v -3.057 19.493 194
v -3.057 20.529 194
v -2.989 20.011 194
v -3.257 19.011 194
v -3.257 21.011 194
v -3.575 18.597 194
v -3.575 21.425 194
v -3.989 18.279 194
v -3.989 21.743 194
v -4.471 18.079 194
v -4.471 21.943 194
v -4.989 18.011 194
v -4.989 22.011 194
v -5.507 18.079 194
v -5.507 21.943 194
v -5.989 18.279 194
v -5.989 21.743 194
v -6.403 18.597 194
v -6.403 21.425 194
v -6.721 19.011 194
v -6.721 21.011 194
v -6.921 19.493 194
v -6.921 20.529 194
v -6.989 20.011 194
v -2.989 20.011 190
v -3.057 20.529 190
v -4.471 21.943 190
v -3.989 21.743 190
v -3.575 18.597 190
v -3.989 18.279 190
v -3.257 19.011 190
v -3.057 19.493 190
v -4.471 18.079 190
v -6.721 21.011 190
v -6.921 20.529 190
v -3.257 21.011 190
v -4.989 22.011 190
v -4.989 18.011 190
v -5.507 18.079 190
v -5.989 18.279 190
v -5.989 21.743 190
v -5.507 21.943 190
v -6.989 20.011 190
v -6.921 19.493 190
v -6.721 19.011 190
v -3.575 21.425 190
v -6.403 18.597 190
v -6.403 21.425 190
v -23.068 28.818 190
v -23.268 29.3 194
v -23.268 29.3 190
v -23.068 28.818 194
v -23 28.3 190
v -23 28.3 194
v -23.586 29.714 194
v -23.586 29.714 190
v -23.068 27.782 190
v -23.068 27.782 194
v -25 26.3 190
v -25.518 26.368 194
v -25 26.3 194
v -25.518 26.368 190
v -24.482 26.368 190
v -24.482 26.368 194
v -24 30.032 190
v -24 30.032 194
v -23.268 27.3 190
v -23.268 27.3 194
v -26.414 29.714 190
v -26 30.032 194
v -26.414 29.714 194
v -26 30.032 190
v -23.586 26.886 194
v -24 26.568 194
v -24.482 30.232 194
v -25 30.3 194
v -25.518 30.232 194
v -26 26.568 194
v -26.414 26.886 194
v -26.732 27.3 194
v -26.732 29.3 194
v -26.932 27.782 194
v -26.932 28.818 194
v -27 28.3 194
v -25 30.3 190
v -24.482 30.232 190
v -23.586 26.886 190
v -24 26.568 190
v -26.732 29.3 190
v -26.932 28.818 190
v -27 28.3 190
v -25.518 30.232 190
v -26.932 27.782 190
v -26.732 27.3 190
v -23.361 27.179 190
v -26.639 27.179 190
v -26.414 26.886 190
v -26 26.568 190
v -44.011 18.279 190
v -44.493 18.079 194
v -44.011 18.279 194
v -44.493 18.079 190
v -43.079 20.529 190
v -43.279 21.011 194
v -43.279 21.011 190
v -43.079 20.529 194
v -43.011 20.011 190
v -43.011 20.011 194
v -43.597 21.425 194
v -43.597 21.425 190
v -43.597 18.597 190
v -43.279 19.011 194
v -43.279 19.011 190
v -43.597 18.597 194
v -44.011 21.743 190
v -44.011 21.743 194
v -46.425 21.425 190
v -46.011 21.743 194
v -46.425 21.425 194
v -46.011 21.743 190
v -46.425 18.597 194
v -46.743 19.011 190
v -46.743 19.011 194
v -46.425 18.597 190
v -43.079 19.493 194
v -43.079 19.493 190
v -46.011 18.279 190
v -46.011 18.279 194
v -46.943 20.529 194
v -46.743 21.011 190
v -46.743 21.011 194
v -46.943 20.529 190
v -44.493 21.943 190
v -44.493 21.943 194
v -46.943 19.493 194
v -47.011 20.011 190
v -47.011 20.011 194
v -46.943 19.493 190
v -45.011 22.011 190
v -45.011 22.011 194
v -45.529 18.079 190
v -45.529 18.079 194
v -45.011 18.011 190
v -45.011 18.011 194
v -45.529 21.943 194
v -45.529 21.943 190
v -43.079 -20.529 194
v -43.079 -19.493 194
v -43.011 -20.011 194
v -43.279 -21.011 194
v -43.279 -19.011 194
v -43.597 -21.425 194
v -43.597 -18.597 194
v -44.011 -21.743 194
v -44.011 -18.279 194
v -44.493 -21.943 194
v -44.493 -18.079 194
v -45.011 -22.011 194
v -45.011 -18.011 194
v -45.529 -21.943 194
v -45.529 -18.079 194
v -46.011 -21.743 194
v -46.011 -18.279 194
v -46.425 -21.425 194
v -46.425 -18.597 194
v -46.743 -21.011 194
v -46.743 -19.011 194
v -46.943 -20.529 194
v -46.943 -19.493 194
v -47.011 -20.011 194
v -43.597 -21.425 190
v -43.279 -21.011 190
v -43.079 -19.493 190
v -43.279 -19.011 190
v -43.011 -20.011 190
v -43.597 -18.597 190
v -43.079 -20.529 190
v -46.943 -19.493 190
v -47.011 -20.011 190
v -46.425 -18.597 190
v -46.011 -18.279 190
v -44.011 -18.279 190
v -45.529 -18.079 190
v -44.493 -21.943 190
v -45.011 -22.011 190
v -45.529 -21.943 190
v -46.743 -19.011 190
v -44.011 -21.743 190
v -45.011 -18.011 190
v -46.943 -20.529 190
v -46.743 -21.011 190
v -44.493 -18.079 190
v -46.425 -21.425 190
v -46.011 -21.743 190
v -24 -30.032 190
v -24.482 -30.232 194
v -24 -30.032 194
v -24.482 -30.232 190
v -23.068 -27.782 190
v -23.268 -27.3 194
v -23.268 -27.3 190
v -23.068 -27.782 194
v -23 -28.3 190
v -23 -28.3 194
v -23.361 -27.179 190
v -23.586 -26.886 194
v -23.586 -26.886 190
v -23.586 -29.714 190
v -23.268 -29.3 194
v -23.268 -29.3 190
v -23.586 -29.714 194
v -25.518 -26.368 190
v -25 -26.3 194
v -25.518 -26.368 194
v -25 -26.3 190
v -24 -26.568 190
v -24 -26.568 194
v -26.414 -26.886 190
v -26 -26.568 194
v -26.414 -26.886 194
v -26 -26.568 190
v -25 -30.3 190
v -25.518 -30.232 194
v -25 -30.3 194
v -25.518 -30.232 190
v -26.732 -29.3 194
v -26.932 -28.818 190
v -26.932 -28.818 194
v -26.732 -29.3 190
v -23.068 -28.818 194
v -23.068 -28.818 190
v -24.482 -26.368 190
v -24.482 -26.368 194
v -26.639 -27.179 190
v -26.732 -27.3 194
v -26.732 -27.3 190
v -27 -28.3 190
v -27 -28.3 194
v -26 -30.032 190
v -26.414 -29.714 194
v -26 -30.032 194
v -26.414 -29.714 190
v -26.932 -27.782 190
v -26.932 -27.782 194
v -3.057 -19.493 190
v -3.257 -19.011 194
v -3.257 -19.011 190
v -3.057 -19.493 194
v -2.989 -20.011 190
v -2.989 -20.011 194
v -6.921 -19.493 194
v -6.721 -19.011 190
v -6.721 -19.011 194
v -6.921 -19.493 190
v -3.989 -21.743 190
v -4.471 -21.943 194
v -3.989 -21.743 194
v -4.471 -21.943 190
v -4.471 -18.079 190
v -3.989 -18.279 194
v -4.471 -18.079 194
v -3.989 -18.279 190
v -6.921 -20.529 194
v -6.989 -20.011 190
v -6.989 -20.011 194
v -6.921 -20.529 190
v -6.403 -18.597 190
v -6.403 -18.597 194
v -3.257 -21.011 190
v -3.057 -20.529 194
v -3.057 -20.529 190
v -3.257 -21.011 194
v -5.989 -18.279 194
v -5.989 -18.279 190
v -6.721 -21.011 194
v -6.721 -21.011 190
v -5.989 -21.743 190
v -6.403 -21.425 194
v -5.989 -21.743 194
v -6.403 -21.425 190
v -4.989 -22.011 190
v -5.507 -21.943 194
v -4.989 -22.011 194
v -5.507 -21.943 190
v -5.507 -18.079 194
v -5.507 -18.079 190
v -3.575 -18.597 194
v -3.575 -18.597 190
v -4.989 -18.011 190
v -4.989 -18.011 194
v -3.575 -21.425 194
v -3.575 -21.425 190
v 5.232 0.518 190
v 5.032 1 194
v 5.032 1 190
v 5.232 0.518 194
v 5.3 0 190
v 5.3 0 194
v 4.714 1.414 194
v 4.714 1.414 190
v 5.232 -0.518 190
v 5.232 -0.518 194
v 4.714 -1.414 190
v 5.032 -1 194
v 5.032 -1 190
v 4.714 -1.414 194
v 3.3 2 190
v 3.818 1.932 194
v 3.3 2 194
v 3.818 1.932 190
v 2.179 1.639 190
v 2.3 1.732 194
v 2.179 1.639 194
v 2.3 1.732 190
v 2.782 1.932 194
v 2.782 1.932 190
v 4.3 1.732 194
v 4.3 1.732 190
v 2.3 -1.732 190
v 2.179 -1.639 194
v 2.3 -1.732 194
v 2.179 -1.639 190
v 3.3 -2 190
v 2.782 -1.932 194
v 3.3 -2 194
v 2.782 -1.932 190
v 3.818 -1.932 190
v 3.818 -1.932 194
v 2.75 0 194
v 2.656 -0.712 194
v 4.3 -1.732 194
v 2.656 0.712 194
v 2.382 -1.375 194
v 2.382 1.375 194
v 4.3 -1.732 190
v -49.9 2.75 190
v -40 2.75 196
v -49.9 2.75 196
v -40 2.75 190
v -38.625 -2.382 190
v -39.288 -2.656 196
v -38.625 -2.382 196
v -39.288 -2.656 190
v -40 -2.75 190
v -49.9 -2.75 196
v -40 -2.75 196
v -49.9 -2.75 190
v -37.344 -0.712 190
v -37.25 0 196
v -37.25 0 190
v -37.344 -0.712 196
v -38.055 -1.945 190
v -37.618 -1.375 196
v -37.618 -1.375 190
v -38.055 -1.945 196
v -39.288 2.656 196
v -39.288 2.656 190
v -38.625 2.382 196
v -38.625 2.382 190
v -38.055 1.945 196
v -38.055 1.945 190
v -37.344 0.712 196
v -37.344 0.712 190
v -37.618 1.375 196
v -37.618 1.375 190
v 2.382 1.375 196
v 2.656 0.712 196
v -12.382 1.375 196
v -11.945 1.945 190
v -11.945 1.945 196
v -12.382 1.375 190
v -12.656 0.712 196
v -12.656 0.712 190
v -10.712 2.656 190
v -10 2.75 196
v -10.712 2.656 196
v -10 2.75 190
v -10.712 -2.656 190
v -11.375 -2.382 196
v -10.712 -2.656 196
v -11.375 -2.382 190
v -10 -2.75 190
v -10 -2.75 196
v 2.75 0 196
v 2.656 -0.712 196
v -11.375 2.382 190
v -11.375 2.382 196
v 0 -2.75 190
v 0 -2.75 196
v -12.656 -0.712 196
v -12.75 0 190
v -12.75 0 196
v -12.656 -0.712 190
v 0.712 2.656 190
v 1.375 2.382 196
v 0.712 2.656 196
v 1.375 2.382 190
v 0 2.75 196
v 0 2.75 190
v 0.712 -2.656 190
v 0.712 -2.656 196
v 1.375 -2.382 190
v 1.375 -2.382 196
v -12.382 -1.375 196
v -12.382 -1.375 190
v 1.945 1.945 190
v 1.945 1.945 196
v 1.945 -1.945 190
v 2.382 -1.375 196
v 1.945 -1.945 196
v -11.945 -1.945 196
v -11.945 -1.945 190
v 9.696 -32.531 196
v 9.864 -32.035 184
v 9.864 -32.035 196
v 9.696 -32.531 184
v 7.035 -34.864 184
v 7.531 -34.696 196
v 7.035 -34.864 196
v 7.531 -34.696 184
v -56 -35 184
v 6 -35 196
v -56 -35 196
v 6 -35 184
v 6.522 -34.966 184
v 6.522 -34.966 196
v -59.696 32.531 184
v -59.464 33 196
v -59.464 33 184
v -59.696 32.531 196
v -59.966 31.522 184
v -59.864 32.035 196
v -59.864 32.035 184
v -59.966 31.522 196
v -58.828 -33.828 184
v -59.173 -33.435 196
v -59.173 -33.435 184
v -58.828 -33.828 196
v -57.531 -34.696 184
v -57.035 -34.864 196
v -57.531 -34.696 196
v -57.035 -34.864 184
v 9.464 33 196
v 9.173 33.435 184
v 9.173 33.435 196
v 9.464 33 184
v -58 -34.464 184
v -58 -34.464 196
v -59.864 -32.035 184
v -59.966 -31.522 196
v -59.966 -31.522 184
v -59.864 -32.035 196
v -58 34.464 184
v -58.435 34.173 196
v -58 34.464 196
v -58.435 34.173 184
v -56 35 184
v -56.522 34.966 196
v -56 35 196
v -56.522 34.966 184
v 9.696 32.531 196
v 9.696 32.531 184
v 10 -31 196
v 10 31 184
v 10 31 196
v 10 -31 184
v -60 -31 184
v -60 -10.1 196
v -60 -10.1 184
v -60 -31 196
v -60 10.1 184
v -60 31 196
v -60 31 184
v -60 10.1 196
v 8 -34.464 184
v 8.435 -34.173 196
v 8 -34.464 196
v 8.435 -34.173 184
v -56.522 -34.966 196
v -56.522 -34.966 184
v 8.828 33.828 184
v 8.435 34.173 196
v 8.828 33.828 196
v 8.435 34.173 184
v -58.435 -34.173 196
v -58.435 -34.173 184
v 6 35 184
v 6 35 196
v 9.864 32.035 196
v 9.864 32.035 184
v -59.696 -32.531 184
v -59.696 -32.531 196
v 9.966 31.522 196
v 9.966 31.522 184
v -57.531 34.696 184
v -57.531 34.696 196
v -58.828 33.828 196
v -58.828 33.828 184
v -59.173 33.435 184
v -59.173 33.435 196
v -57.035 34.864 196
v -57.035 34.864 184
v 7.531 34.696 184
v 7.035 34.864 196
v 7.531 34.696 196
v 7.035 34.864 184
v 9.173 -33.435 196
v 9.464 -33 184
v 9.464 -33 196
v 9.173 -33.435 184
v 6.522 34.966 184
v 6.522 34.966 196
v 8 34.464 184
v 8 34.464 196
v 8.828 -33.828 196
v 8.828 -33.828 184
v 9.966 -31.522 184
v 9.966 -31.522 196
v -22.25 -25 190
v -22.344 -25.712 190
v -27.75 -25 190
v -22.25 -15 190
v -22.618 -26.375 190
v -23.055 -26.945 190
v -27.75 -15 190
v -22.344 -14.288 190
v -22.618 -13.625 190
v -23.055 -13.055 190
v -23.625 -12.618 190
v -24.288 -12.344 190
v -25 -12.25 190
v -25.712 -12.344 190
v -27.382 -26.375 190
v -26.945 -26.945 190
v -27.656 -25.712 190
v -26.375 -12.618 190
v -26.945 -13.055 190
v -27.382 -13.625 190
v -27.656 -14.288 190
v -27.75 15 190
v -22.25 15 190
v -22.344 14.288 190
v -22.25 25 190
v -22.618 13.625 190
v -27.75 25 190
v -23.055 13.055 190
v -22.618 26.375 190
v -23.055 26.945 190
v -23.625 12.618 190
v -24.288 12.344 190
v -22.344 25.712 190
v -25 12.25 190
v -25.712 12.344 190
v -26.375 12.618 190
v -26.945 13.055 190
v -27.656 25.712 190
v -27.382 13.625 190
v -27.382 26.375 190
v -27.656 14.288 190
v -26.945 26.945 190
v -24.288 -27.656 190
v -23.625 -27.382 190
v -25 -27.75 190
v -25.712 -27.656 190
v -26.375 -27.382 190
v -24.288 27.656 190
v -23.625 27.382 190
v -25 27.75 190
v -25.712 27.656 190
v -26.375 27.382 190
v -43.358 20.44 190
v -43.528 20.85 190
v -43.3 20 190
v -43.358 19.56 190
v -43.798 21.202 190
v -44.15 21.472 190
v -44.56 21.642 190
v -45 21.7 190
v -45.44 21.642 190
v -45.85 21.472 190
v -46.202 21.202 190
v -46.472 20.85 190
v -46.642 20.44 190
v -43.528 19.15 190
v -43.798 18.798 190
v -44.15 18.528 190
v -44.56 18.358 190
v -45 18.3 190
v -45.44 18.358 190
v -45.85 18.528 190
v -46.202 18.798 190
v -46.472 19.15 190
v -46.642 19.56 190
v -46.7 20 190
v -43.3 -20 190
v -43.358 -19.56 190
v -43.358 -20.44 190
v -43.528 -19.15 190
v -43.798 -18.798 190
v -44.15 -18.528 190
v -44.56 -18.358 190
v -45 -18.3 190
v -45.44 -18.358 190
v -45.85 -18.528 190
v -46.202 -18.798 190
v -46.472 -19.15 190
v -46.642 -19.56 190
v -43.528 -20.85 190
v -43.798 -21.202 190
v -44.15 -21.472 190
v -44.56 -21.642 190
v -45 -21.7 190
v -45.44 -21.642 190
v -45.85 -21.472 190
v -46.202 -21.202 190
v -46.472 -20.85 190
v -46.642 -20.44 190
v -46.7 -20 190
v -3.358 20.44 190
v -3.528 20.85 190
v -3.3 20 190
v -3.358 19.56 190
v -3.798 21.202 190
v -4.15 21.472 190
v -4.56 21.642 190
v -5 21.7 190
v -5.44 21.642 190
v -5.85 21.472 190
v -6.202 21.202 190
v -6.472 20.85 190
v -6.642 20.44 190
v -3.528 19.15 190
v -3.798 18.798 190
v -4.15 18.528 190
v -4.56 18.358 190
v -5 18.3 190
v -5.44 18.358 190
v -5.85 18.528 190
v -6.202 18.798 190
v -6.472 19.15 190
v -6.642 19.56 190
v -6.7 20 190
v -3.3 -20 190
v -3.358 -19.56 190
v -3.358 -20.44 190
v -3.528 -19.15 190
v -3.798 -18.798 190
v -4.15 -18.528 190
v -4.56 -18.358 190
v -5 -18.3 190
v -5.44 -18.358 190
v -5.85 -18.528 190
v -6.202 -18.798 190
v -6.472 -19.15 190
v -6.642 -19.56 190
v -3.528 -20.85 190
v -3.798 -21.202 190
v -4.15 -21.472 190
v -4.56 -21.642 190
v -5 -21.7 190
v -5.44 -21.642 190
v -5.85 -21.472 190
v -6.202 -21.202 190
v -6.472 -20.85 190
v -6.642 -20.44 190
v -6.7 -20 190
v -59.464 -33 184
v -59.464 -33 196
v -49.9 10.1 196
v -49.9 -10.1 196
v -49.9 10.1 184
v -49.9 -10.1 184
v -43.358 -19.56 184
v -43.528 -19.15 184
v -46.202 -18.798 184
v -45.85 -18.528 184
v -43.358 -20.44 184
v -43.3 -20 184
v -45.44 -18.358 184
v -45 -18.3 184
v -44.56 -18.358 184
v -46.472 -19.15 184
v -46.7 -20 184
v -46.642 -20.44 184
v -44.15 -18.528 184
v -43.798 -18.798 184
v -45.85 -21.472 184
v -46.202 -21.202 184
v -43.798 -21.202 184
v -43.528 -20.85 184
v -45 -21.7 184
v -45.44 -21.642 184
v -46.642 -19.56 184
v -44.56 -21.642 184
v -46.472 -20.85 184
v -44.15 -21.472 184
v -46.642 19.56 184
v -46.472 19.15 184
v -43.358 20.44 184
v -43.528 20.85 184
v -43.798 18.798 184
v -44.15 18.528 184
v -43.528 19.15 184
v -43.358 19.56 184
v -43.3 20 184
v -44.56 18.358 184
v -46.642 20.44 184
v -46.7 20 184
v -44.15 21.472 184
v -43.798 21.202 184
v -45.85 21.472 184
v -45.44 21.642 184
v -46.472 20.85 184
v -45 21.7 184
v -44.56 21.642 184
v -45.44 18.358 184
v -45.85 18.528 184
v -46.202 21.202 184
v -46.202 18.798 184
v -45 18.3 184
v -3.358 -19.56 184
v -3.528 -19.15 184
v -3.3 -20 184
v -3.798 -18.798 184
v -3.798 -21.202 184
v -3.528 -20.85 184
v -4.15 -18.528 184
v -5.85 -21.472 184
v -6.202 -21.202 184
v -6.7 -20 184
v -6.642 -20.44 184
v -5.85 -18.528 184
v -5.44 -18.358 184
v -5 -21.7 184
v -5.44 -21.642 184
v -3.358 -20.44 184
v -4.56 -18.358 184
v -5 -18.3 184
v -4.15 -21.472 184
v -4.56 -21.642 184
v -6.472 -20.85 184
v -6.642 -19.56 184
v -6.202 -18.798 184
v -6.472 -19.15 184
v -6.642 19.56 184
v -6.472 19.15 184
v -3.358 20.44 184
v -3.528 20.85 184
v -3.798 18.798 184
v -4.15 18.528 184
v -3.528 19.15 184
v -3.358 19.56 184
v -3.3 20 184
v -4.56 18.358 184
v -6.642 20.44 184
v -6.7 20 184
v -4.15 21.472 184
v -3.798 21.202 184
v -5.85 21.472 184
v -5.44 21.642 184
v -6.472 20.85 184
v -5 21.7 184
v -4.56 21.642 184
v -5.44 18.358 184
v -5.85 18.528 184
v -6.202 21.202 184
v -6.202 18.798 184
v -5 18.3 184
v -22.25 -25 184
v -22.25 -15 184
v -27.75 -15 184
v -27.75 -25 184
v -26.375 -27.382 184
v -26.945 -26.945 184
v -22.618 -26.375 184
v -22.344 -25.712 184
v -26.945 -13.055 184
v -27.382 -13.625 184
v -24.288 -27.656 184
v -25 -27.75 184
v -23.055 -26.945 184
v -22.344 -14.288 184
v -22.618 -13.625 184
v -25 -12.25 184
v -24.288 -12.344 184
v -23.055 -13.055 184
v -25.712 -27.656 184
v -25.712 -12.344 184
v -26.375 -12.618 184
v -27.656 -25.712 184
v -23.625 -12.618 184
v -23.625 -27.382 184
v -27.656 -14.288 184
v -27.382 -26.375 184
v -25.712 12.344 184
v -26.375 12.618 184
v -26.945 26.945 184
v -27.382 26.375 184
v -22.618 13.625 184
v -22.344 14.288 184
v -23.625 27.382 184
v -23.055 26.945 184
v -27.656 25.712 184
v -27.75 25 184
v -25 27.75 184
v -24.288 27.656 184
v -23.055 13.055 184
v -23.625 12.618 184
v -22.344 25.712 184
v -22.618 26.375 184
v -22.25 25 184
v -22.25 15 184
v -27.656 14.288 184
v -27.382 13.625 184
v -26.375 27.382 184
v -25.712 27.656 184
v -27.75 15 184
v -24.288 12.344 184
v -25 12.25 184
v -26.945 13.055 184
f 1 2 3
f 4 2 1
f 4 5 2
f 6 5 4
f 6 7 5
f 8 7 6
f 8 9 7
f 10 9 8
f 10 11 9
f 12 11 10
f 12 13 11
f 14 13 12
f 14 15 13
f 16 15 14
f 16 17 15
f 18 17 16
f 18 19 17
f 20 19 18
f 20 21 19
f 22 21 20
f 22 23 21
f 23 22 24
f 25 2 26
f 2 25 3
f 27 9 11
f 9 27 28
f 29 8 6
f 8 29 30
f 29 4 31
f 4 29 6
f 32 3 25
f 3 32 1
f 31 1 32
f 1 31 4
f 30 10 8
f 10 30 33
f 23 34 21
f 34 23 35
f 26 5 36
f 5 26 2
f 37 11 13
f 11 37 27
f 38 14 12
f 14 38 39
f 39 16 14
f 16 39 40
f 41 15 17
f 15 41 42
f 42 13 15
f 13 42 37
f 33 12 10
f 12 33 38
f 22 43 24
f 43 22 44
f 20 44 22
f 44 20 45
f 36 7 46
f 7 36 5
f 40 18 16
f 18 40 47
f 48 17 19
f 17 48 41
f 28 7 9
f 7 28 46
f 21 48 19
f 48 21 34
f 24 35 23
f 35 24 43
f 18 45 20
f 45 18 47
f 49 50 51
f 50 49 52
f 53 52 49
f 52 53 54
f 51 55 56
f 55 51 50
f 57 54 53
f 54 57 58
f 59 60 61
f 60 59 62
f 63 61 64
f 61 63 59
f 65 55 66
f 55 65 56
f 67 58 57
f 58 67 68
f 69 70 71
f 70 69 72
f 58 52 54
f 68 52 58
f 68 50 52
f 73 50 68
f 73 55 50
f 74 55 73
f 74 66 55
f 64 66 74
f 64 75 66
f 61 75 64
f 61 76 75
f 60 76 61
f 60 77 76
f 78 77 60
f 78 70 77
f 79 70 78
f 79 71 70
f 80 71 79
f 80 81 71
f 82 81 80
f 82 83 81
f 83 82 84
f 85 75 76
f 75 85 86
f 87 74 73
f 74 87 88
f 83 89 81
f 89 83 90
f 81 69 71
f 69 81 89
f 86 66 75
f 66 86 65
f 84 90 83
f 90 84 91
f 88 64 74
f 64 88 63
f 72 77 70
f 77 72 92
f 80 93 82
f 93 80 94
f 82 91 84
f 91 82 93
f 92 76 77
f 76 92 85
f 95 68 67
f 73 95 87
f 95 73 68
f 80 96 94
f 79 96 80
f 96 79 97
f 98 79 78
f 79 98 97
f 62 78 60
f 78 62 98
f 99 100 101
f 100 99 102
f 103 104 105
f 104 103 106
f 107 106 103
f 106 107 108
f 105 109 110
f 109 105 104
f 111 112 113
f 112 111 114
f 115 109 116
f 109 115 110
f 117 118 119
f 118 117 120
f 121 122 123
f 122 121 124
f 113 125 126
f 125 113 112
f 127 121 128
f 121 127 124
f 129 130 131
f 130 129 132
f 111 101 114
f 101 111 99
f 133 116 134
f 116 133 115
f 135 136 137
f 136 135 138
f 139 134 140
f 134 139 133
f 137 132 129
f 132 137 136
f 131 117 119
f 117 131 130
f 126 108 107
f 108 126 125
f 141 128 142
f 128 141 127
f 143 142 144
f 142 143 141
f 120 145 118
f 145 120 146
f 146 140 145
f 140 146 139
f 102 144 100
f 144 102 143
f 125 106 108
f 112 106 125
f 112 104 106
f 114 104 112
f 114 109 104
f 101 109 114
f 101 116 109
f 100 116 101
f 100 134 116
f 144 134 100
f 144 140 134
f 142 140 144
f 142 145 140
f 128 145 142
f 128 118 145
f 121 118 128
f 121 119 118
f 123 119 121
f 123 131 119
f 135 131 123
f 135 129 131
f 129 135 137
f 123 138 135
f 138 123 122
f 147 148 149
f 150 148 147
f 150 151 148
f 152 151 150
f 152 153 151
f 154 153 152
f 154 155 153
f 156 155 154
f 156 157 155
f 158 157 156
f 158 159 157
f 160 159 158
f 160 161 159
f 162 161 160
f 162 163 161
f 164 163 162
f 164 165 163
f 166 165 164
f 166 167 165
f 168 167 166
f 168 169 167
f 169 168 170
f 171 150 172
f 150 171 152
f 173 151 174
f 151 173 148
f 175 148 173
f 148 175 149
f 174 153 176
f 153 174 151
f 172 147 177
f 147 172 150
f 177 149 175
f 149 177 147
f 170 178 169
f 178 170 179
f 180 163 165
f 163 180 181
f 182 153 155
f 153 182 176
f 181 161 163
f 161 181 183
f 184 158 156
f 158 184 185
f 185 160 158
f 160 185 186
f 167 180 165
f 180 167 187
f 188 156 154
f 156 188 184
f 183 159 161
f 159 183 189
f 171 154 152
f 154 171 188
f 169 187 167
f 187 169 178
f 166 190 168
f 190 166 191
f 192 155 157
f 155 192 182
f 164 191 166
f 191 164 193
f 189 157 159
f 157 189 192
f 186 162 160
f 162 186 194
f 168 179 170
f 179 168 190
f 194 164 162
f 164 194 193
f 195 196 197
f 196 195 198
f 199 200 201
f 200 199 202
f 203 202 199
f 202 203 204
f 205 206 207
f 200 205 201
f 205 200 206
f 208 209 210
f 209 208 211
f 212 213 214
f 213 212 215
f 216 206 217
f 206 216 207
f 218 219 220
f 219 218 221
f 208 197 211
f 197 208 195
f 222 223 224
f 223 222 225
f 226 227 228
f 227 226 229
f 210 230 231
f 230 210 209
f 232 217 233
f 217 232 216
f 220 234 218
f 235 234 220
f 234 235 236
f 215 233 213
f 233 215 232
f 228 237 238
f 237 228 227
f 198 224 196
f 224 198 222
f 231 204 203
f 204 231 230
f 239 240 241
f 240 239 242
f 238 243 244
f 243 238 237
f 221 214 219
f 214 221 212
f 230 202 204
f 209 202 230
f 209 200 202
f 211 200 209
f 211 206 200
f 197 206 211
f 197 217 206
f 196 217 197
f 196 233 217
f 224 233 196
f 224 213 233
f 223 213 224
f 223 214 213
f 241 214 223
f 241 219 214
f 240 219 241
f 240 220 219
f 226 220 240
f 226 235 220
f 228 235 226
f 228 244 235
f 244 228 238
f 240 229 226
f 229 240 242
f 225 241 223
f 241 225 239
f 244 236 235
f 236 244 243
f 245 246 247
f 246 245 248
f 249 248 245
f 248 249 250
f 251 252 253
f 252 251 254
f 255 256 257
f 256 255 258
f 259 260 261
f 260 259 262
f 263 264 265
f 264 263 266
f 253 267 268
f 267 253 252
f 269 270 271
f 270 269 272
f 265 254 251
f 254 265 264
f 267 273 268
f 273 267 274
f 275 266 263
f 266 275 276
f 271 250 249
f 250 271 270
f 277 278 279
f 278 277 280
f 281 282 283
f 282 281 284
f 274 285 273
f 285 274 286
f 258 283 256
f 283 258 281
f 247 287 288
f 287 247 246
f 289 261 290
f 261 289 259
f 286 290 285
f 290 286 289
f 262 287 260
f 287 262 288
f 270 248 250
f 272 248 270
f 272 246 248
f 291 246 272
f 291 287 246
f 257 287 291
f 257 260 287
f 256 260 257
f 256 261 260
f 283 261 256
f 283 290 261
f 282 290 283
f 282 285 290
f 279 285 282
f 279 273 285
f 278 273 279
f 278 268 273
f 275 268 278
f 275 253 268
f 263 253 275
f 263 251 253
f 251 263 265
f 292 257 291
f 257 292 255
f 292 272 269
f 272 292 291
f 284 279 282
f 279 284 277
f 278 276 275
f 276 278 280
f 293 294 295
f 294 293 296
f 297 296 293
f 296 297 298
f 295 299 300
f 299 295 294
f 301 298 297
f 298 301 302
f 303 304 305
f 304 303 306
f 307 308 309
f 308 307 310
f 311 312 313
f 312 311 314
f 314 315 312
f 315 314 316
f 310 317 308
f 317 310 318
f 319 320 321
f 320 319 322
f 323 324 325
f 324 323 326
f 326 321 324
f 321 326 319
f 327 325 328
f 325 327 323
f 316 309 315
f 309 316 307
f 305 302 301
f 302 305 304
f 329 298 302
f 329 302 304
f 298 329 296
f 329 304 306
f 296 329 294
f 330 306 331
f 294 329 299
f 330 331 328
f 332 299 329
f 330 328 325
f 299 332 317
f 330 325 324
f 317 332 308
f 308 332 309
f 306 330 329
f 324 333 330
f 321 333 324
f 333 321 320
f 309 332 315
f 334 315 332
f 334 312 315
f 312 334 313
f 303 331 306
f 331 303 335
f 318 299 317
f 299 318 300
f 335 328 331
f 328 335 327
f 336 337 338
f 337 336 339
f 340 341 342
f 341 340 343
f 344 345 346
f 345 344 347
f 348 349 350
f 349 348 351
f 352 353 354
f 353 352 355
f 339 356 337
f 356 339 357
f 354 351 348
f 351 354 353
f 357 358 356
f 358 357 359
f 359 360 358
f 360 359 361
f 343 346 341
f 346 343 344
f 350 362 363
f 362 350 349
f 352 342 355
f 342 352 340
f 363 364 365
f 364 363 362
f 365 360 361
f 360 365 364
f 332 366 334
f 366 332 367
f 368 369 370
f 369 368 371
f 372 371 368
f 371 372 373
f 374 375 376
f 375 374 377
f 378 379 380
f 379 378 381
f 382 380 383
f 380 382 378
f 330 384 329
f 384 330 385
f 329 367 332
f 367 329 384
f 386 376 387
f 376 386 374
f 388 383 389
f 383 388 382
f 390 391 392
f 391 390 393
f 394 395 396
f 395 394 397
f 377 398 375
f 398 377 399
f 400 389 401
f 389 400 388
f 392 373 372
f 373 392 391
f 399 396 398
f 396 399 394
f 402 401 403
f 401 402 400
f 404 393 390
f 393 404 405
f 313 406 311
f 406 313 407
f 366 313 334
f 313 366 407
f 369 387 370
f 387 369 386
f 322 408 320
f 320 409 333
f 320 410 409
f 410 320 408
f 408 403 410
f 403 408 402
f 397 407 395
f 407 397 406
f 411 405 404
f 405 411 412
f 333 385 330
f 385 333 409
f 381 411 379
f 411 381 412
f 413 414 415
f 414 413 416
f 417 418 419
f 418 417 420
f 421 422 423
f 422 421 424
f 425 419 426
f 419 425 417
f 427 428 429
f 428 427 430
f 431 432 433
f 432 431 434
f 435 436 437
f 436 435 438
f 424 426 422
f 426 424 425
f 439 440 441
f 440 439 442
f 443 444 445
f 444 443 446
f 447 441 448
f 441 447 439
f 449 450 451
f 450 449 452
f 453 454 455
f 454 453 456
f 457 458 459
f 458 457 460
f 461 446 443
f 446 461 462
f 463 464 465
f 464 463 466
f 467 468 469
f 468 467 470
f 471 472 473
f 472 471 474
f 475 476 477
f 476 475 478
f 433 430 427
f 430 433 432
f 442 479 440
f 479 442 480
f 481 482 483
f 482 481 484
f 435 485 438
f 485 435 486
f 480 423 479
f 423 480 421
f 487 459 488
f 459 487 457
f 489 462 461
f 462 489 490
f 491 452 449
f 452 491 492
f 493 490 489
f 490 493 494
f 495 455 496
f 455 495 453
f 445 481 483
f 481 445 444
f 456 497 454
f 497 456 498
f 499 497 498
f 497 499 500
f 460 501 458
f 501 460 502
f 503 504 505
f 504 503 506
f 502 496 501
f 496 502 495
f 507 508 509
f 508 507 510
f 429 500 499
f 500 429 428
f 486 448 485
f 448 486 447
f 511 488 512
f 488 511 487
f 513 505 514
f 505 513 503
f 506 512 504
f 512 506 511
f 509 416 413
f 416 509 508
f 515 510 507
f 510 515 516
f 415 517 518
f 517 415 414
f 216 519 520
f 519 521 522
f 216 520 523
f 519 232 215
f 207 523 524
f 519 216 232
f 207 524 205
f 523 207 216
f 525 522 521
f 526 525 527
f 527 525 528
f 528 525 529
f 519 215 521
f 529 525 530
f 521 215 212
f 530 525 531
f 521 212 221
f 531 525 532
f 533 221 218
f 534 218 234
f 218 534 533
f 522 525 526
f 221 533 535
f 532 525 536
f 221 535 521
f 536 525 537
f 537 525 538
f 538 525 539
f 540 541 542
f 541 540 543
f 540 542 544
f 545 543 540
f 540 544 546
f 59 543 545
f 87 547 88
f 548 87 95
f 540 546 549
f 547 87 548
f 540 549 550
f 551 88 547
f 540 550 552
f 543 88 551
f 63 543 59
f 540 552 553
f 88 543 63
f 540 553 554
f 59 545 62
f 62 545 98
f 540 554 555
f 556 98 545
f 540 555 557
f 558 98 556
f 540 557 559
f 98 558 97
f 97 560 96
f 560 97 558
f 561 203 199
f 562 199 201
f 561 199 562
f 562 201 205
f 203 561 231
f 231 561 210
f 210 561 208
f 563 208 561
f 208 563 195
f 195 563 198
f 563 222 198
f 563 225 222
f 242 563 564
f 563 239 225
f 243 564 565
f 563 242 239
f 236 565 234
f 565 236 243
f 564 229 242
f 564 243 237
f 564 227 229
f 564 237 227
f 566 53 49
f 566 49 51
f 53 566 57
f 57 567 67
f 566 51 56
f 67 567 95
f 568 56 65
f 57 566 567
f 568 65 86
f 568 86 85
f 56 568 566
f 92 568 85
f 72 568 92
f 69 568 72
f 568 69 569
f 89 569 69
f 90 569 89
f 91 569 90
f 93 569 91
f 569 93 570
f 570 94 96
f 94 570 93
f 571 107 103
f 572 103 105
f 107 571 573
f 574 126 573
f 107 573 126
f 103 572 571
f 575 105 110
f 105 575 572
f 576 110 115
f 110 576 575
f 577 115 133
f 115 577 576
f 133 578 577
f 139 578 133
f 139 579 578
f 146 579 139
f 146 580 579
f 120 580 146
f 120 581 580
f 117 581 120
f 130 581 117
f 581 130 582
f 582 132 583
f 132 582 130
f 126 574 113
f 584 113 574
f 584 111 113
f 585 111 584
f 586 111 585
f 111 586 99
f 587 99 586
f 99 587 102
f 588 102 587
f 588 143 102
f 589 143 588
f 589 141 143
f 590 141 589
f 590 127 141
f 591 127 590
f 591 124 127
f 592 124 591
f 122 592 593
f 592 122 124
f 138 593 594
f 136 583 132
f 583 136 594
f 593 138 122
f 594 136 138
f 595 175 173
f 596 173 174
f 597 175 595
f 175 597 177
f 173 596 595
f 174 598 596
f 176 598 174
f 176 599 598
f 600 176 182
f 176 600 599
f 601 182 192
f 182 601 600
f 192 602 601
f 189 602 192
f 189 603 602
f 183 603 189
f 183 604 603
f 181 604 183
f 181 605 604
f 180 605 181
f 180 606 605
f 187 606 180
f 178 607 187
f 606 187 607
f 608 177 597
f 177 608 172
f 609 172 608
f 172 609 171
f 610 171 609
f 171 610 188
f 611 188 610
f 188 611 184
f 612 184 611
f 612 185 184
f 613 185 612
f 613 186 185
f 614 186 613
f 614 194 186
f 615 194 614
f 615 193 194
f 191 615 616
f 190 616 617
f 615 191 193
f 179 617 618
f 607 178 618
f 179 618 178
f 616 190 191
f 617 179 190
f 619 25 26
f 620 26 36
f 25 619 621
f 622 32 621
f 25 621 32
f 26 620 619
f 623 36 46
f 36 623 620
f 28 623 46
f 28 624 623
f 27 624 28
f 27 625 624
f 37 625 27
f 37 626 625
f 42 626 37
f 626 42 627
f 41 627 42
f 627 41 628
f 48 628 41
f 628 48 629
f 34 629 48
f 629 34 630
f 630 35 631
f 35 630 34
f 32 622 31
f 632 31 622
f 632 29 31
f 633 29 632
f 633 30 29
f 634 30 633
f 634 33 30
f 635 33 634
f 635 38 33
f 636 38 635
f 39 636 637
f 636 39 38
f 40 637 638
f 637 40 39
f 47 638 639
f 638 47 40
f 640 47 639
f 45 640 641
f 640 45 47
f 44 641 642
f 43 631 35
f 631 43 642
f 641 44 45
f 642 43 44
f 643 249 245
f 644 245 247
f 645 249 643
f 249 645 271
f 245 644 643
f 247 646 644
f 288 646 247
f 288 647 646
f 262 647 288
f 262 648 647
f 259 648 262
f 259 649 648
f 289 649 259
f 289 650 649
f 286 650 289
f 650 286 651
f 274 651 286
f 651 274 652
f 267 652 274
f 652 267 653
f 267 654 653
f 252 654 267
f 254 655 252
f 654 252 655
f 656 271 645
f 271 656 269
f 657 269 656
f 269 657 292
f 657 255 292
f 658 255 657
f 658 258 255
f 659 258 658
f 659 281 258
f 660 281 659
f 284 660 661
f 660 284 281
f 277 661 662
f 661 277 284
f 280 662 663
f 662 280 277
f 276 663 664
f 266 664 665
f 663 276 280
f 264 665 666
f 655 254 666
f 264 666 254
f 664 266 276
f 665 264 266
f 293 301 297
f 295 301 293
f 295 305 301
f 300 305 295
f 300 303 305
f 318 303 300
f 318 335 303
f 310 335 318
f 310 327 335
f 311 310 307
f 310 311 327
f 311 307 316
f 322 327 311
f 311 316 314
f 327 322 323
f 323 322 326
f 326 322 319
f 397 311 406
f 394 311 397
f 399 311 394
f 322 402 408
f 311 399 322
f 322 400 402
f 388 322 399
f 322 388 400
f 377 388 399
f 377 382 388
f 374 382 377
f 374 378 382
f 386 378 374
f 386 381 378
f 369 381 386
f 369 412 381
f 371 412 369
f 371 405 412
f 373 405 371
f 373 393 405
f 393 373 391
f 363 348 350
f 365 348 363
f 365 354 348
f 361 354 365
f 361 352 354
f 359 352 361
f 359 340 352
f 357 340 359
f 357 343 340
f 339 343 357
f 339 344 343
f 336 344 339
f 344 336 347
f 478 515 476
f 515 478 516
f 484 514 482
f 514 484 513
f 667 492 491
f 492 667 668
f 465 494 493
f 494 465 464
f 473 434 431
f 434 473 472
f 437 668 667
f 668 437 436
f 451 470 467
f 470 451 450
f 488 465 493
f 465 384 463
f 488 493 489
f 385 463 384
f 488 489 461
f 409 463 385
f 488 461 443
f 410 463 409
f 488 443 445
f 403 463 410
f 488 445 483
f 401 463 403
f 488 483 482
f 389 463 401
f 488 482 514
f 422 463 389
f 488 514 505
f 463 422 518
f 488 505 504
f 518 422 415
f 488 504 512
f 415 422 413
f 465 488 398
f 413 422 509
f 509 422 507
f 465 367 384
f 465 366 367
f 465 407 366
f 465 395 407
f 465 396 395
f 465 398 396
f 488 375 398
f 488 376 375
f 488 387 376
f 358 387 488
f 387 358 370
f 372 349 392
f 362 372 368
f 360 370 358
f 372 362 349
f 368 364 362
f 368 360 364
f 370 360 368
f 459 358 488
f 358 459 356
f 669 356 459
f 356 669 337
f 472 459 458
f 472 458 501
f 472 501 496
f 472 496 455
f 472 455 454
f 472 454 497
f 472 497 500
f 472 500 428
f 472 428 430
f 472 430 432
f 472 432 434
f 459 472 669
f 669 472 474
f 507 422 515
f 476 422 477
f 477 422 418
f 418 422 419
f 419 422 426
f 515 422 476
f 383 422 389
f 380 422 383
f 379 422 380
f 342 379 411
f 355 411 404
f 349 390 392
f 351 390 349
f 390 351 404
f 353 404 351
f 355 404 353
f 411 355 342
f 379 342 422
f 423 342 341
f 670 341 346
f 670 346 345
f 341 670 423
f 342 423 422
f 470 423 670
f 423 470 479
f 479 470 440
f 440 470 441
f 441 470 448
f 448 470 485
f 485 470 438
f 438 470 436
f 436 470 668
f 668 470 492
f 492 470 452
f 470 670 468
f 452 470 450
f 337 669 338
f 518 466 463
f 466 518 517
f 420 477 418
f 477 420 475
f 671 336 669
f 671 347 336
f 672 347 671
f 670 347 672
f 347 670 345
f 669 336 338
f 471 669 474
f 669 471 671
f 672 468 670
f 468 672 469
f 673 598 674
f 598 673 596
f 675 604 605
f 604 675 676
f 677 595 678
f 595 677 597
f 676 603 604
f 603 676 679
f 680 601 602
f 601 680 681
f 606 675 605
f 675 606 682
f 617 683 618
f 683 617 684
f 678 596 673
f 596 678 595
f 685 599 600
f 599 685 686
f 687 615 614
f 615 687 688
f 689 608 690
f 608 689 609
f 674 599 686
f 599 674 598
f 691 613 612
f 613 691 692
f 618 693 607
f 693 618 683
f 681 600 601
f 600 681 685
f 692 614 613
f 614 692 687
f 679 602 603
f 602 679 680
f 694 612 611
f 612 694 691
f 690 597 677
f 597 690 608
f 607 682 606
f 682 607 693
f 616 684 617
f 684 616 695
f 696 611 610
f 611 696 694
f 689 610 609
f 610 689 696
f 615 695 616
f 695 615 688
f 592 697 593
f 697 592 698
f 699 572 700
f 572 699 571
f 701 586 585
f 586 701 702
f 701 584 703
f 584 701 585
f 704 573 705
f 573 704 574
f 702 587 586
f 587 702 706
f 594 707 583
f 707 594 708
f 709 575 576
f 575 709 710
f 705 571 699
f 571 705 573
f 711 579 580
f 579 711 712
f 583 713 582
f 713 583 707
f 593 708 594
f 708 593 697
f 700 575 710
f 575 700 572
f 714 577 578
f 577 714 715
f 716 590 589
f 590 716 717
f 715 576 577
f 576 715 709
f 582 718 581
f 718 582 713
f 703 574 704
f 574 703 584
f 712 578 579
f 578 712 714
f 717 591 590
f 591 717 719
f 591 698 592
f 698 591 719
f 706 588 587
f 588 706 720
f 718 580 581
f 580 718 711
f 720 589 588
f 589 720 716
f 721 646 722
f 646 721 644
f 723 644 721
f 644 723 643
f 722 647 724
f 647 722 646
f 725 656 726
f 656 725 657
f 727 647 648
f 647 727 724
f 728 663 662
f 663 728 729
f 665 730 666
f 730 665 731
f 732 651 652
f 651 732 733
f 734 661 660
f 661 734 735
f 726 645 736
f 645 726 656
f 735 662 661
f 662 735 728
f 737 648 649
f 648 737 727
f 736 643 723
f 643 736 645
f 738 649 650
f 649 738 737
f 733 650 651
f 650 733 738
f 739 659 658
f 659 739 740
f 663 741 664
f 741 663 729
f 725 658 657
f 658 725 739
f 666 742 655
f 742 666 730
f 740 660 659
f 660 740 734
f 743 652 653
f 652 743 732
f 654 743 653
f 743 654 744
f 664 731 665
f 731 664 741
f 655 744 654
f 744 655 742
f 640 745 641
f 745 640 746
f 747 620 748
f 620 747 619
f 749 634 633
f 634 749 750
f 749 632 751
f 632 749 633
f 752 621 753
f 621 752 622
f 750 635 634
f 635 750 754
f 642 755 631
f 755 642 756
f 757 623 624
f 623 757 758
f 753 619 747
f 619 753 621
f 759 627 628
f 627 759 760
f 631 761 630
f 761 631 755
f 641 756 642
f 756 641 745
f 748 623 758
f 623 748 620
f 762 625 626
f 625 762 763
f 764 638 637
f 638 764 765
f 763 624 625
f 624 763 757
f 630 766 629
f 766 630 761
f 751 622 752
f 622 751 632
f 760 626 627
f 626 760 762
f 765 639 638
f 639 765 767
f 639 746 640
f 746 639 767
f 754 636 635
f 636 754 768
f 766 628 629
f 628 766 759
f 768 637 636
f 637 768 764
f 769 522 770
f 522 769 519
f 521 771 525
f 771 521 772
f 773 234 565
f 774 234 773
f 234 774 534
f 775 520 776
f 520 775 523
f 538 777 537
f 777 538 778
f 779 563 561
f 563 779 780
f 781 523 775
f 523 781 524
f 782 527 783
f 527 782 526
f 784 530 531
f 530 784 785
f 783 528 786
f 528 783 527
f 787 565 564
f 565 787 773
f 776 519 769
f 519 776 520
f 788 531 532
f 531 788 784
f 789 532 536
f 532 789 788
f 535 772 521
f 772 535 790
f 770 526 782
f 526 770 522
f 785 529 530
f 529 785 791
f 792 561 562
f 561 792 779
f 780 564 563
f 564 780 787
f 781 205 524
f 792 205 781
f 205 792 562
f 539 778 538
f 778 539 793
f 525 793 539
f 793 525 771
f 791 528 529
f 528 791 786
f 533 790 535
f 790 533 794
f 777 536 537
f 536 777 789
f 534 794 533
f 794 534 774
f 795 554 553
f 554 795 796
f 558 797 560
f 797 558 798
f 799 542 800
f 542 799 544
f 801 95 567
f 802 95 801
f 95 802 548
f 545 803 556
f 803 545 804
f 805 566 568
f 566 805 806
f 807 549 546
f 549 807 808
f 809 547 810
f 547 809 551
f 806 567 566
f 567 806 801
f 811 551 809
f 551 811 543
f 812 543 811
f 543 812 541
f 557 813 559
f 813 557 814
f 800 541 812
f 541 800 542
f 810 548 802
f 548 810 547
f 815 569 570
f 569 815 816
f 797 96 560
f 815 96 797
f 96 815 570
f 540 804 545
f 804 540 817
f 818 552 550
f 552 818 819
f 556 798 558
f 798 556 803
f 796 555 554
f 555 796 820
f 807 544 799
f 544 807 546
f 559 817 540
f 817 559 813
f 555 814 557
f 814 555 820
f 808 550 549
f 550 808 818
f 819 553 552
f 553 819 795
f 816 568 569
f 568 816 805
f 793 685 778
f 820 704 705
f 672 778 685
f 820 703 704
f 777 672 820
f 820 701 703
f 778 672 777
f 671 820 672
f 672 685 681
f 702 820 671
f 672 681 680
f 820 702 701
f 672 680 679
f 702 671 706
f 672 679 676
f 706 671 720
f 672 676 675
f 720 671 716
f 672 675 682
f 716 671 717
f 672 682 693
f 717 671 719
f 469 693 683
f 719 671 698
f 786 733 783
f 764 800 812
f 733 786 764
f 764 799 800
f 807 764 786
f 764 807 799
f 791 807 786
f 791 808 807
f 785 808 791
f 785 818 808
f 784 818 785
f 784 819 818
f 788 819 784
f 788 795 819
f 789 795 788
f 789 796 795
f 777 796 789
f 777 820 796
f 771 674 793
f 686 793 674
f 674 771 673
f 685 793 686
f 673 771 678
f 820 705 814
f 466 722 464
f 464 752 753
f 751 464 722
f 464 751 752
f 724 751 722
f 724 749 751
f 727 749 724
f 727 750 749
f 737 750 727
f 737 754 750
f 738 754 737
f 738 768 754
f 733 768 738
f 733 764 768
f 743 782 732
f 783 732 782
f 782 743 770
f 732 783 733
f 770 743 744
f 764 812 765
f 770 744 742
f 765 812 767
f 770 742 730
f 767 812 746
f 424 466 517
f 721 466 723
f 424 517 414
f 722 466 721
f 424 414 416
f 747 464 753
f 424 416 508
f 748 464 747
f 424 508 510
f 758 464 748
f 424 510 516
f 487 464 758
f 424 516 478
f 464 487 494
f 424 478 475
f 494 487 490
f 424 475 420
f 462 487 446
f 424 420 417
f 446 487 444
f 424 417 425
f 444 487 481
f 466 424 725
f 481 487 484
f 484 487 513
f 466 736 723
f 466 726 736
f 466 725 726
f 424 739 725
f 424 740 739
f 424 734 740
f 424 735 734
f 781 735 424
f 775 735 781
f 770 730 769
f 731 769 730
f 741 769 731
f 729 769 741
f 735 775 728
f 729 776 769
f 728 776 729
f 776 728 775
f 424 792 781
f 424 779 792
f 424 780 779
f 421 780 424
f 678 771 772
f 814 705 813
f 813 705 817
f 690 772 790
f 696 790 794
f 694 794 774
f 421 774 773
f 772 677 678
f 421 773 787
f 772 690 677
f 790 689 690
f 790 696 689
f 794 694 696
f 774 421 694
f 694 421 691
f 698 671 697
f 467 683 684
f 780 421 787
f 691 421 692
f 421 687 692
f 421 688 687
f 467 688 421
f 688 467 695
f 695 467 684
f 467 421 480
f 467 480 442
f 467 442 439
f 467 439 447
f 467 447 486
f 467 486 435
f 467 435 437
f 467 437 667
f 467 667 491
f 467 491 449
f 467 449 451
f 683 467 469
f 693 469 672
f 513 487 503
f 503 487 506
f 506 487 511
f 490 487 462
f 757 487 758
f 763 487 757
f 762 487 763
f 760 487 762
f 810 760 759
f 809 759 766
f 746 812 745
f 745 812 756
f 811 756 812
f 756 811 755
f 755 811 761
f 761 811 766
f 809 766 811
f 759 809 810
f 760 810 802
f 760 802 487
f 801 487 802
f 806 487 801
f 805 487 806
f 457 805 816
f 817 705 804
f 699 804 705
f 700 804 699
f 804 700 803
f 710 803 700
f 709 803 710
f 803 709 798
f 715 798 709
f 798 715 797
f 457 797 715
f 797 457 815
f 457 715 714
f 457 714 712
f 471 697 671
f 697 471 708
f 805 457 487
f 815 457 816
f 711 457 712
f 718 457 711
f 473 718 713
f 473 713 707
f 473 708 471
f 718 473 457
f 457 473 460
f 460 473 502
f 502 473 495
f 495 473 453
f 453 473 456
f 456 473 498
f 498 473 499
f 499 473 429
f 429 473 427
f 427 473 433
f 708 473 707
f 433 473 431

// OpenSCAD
// =====================================================================
//  p08_p09_yaw_plates.scad - P8 frame yaw plate (under the spine) and P9 carrier yaw plate (on the carrier beam)
//  PROJECT SCRATCH · 05-engineering/cad/frame · units: mm · frame: global (section 2)
//  Sources: mechanical.md section 5.4 (70 x 70 x 6, yaw axis X -25; P9: 4 x diam 3.4 on a 40 x 40 square; P8: 8 M3
//  inserts on diam 56.6 at 45 deg; 2 x M5 slots each), 2 (P9 Z 184..190, P8 Z 190..196), 11 P8/P9.
//  PART = "frame" | "carrier" | "both".
//  Both plates are notched for the 2020 post (X -70..-50, Y +/-10), which passes through them (section 2: post to
//  Z 198, plates from Z 184).  The 180 deg insert at (-53.3, 0) falls in the notch: P8 carries 7 inserts (C-F5).
// =====================================================================
include <lib_sp1.scad>
PART = "both";
S = 70;  T = 6;  R = 4;
F_Z0 = 190;  F_Z1 = 196;  BC_D = 56.6;  N = 8;  F_SLOT_X = [-45, -5];  SLOT_L = 10;
C_Z0 = 184;  C_Z1 = 190;  SQ = 40;  C_SLOT_Y = [-20, 20];

module p08_frame_yaw_plate() difference() {
    rbox_z(YAW_X - S / 2, YAW_X + S / 2, -S / 2, S / 2, F_Z0, F_Z1, R);
    post_notch(F_Z0, F_Z1);
    for (i = [0 : N - 1]) {
        hx = YAW_X + BC_D / 2 * cos(45 + 45 * i); hy = BC_D / 2 * sin(45 + 45 * i);
        if (!(hx < POST[1] + M3_INS_D / 2 + 1 && abs(hy) < EXT_SOCK / 2 + M3_INS_D / 2 + 1)) ins_z(M3_INS_D, M3_INS_L, hx, hy, F_Z0, false);
    }
    for (xs = F_SLOT_X) hull() { cyl_z(M5_CLEAR / 2, F_Z0 - 1, F_Z1 + 1, xs - SLOT_L / 2, 0, fn = 24); cyl_z(M5_CLEAR / 2, F_Z0 - 1, F_Z1 + 1, xs + SLOT_L / 2, 0, fn = 24); }
}
module p09_carrier_yaw_plate() difference() {
    rbox_z(YAW_X - S / 2, YAW_X + S / 2, -S / 2, S / 2, C_Z0, C_Z1, R);
    post_notch(C_Z0, C_Z1);
    for (dx = [-SQ / 2, SQ / 2]) for (dy = [-SQ / 2, SQ / 2]) cyl_z(M3_CLEAR / 2, C_Z0 - 1, C_Z1 + 1, YAW_X + dx, dy, fn = 24);
    for (ys = C_SLOT_Y) hull() { cyl_z(M5_CLEAR / 2, C_Z0 - 1, C_Z1 + 1, YAW_X, ys - SLOT_L / 2, fn = 24); cyl_z(M5_CLEAR / 2, C_Z0 - 1, C_Z1 + 1, YAW_X, ys + SLOT_L / 2, fn = 24); }
}
if (PART == "frame" || PART == "both") p08_frame_yaw_plate();
if (PART == "carrier" || PART == "both") p09_carrier_yaw_plate();
